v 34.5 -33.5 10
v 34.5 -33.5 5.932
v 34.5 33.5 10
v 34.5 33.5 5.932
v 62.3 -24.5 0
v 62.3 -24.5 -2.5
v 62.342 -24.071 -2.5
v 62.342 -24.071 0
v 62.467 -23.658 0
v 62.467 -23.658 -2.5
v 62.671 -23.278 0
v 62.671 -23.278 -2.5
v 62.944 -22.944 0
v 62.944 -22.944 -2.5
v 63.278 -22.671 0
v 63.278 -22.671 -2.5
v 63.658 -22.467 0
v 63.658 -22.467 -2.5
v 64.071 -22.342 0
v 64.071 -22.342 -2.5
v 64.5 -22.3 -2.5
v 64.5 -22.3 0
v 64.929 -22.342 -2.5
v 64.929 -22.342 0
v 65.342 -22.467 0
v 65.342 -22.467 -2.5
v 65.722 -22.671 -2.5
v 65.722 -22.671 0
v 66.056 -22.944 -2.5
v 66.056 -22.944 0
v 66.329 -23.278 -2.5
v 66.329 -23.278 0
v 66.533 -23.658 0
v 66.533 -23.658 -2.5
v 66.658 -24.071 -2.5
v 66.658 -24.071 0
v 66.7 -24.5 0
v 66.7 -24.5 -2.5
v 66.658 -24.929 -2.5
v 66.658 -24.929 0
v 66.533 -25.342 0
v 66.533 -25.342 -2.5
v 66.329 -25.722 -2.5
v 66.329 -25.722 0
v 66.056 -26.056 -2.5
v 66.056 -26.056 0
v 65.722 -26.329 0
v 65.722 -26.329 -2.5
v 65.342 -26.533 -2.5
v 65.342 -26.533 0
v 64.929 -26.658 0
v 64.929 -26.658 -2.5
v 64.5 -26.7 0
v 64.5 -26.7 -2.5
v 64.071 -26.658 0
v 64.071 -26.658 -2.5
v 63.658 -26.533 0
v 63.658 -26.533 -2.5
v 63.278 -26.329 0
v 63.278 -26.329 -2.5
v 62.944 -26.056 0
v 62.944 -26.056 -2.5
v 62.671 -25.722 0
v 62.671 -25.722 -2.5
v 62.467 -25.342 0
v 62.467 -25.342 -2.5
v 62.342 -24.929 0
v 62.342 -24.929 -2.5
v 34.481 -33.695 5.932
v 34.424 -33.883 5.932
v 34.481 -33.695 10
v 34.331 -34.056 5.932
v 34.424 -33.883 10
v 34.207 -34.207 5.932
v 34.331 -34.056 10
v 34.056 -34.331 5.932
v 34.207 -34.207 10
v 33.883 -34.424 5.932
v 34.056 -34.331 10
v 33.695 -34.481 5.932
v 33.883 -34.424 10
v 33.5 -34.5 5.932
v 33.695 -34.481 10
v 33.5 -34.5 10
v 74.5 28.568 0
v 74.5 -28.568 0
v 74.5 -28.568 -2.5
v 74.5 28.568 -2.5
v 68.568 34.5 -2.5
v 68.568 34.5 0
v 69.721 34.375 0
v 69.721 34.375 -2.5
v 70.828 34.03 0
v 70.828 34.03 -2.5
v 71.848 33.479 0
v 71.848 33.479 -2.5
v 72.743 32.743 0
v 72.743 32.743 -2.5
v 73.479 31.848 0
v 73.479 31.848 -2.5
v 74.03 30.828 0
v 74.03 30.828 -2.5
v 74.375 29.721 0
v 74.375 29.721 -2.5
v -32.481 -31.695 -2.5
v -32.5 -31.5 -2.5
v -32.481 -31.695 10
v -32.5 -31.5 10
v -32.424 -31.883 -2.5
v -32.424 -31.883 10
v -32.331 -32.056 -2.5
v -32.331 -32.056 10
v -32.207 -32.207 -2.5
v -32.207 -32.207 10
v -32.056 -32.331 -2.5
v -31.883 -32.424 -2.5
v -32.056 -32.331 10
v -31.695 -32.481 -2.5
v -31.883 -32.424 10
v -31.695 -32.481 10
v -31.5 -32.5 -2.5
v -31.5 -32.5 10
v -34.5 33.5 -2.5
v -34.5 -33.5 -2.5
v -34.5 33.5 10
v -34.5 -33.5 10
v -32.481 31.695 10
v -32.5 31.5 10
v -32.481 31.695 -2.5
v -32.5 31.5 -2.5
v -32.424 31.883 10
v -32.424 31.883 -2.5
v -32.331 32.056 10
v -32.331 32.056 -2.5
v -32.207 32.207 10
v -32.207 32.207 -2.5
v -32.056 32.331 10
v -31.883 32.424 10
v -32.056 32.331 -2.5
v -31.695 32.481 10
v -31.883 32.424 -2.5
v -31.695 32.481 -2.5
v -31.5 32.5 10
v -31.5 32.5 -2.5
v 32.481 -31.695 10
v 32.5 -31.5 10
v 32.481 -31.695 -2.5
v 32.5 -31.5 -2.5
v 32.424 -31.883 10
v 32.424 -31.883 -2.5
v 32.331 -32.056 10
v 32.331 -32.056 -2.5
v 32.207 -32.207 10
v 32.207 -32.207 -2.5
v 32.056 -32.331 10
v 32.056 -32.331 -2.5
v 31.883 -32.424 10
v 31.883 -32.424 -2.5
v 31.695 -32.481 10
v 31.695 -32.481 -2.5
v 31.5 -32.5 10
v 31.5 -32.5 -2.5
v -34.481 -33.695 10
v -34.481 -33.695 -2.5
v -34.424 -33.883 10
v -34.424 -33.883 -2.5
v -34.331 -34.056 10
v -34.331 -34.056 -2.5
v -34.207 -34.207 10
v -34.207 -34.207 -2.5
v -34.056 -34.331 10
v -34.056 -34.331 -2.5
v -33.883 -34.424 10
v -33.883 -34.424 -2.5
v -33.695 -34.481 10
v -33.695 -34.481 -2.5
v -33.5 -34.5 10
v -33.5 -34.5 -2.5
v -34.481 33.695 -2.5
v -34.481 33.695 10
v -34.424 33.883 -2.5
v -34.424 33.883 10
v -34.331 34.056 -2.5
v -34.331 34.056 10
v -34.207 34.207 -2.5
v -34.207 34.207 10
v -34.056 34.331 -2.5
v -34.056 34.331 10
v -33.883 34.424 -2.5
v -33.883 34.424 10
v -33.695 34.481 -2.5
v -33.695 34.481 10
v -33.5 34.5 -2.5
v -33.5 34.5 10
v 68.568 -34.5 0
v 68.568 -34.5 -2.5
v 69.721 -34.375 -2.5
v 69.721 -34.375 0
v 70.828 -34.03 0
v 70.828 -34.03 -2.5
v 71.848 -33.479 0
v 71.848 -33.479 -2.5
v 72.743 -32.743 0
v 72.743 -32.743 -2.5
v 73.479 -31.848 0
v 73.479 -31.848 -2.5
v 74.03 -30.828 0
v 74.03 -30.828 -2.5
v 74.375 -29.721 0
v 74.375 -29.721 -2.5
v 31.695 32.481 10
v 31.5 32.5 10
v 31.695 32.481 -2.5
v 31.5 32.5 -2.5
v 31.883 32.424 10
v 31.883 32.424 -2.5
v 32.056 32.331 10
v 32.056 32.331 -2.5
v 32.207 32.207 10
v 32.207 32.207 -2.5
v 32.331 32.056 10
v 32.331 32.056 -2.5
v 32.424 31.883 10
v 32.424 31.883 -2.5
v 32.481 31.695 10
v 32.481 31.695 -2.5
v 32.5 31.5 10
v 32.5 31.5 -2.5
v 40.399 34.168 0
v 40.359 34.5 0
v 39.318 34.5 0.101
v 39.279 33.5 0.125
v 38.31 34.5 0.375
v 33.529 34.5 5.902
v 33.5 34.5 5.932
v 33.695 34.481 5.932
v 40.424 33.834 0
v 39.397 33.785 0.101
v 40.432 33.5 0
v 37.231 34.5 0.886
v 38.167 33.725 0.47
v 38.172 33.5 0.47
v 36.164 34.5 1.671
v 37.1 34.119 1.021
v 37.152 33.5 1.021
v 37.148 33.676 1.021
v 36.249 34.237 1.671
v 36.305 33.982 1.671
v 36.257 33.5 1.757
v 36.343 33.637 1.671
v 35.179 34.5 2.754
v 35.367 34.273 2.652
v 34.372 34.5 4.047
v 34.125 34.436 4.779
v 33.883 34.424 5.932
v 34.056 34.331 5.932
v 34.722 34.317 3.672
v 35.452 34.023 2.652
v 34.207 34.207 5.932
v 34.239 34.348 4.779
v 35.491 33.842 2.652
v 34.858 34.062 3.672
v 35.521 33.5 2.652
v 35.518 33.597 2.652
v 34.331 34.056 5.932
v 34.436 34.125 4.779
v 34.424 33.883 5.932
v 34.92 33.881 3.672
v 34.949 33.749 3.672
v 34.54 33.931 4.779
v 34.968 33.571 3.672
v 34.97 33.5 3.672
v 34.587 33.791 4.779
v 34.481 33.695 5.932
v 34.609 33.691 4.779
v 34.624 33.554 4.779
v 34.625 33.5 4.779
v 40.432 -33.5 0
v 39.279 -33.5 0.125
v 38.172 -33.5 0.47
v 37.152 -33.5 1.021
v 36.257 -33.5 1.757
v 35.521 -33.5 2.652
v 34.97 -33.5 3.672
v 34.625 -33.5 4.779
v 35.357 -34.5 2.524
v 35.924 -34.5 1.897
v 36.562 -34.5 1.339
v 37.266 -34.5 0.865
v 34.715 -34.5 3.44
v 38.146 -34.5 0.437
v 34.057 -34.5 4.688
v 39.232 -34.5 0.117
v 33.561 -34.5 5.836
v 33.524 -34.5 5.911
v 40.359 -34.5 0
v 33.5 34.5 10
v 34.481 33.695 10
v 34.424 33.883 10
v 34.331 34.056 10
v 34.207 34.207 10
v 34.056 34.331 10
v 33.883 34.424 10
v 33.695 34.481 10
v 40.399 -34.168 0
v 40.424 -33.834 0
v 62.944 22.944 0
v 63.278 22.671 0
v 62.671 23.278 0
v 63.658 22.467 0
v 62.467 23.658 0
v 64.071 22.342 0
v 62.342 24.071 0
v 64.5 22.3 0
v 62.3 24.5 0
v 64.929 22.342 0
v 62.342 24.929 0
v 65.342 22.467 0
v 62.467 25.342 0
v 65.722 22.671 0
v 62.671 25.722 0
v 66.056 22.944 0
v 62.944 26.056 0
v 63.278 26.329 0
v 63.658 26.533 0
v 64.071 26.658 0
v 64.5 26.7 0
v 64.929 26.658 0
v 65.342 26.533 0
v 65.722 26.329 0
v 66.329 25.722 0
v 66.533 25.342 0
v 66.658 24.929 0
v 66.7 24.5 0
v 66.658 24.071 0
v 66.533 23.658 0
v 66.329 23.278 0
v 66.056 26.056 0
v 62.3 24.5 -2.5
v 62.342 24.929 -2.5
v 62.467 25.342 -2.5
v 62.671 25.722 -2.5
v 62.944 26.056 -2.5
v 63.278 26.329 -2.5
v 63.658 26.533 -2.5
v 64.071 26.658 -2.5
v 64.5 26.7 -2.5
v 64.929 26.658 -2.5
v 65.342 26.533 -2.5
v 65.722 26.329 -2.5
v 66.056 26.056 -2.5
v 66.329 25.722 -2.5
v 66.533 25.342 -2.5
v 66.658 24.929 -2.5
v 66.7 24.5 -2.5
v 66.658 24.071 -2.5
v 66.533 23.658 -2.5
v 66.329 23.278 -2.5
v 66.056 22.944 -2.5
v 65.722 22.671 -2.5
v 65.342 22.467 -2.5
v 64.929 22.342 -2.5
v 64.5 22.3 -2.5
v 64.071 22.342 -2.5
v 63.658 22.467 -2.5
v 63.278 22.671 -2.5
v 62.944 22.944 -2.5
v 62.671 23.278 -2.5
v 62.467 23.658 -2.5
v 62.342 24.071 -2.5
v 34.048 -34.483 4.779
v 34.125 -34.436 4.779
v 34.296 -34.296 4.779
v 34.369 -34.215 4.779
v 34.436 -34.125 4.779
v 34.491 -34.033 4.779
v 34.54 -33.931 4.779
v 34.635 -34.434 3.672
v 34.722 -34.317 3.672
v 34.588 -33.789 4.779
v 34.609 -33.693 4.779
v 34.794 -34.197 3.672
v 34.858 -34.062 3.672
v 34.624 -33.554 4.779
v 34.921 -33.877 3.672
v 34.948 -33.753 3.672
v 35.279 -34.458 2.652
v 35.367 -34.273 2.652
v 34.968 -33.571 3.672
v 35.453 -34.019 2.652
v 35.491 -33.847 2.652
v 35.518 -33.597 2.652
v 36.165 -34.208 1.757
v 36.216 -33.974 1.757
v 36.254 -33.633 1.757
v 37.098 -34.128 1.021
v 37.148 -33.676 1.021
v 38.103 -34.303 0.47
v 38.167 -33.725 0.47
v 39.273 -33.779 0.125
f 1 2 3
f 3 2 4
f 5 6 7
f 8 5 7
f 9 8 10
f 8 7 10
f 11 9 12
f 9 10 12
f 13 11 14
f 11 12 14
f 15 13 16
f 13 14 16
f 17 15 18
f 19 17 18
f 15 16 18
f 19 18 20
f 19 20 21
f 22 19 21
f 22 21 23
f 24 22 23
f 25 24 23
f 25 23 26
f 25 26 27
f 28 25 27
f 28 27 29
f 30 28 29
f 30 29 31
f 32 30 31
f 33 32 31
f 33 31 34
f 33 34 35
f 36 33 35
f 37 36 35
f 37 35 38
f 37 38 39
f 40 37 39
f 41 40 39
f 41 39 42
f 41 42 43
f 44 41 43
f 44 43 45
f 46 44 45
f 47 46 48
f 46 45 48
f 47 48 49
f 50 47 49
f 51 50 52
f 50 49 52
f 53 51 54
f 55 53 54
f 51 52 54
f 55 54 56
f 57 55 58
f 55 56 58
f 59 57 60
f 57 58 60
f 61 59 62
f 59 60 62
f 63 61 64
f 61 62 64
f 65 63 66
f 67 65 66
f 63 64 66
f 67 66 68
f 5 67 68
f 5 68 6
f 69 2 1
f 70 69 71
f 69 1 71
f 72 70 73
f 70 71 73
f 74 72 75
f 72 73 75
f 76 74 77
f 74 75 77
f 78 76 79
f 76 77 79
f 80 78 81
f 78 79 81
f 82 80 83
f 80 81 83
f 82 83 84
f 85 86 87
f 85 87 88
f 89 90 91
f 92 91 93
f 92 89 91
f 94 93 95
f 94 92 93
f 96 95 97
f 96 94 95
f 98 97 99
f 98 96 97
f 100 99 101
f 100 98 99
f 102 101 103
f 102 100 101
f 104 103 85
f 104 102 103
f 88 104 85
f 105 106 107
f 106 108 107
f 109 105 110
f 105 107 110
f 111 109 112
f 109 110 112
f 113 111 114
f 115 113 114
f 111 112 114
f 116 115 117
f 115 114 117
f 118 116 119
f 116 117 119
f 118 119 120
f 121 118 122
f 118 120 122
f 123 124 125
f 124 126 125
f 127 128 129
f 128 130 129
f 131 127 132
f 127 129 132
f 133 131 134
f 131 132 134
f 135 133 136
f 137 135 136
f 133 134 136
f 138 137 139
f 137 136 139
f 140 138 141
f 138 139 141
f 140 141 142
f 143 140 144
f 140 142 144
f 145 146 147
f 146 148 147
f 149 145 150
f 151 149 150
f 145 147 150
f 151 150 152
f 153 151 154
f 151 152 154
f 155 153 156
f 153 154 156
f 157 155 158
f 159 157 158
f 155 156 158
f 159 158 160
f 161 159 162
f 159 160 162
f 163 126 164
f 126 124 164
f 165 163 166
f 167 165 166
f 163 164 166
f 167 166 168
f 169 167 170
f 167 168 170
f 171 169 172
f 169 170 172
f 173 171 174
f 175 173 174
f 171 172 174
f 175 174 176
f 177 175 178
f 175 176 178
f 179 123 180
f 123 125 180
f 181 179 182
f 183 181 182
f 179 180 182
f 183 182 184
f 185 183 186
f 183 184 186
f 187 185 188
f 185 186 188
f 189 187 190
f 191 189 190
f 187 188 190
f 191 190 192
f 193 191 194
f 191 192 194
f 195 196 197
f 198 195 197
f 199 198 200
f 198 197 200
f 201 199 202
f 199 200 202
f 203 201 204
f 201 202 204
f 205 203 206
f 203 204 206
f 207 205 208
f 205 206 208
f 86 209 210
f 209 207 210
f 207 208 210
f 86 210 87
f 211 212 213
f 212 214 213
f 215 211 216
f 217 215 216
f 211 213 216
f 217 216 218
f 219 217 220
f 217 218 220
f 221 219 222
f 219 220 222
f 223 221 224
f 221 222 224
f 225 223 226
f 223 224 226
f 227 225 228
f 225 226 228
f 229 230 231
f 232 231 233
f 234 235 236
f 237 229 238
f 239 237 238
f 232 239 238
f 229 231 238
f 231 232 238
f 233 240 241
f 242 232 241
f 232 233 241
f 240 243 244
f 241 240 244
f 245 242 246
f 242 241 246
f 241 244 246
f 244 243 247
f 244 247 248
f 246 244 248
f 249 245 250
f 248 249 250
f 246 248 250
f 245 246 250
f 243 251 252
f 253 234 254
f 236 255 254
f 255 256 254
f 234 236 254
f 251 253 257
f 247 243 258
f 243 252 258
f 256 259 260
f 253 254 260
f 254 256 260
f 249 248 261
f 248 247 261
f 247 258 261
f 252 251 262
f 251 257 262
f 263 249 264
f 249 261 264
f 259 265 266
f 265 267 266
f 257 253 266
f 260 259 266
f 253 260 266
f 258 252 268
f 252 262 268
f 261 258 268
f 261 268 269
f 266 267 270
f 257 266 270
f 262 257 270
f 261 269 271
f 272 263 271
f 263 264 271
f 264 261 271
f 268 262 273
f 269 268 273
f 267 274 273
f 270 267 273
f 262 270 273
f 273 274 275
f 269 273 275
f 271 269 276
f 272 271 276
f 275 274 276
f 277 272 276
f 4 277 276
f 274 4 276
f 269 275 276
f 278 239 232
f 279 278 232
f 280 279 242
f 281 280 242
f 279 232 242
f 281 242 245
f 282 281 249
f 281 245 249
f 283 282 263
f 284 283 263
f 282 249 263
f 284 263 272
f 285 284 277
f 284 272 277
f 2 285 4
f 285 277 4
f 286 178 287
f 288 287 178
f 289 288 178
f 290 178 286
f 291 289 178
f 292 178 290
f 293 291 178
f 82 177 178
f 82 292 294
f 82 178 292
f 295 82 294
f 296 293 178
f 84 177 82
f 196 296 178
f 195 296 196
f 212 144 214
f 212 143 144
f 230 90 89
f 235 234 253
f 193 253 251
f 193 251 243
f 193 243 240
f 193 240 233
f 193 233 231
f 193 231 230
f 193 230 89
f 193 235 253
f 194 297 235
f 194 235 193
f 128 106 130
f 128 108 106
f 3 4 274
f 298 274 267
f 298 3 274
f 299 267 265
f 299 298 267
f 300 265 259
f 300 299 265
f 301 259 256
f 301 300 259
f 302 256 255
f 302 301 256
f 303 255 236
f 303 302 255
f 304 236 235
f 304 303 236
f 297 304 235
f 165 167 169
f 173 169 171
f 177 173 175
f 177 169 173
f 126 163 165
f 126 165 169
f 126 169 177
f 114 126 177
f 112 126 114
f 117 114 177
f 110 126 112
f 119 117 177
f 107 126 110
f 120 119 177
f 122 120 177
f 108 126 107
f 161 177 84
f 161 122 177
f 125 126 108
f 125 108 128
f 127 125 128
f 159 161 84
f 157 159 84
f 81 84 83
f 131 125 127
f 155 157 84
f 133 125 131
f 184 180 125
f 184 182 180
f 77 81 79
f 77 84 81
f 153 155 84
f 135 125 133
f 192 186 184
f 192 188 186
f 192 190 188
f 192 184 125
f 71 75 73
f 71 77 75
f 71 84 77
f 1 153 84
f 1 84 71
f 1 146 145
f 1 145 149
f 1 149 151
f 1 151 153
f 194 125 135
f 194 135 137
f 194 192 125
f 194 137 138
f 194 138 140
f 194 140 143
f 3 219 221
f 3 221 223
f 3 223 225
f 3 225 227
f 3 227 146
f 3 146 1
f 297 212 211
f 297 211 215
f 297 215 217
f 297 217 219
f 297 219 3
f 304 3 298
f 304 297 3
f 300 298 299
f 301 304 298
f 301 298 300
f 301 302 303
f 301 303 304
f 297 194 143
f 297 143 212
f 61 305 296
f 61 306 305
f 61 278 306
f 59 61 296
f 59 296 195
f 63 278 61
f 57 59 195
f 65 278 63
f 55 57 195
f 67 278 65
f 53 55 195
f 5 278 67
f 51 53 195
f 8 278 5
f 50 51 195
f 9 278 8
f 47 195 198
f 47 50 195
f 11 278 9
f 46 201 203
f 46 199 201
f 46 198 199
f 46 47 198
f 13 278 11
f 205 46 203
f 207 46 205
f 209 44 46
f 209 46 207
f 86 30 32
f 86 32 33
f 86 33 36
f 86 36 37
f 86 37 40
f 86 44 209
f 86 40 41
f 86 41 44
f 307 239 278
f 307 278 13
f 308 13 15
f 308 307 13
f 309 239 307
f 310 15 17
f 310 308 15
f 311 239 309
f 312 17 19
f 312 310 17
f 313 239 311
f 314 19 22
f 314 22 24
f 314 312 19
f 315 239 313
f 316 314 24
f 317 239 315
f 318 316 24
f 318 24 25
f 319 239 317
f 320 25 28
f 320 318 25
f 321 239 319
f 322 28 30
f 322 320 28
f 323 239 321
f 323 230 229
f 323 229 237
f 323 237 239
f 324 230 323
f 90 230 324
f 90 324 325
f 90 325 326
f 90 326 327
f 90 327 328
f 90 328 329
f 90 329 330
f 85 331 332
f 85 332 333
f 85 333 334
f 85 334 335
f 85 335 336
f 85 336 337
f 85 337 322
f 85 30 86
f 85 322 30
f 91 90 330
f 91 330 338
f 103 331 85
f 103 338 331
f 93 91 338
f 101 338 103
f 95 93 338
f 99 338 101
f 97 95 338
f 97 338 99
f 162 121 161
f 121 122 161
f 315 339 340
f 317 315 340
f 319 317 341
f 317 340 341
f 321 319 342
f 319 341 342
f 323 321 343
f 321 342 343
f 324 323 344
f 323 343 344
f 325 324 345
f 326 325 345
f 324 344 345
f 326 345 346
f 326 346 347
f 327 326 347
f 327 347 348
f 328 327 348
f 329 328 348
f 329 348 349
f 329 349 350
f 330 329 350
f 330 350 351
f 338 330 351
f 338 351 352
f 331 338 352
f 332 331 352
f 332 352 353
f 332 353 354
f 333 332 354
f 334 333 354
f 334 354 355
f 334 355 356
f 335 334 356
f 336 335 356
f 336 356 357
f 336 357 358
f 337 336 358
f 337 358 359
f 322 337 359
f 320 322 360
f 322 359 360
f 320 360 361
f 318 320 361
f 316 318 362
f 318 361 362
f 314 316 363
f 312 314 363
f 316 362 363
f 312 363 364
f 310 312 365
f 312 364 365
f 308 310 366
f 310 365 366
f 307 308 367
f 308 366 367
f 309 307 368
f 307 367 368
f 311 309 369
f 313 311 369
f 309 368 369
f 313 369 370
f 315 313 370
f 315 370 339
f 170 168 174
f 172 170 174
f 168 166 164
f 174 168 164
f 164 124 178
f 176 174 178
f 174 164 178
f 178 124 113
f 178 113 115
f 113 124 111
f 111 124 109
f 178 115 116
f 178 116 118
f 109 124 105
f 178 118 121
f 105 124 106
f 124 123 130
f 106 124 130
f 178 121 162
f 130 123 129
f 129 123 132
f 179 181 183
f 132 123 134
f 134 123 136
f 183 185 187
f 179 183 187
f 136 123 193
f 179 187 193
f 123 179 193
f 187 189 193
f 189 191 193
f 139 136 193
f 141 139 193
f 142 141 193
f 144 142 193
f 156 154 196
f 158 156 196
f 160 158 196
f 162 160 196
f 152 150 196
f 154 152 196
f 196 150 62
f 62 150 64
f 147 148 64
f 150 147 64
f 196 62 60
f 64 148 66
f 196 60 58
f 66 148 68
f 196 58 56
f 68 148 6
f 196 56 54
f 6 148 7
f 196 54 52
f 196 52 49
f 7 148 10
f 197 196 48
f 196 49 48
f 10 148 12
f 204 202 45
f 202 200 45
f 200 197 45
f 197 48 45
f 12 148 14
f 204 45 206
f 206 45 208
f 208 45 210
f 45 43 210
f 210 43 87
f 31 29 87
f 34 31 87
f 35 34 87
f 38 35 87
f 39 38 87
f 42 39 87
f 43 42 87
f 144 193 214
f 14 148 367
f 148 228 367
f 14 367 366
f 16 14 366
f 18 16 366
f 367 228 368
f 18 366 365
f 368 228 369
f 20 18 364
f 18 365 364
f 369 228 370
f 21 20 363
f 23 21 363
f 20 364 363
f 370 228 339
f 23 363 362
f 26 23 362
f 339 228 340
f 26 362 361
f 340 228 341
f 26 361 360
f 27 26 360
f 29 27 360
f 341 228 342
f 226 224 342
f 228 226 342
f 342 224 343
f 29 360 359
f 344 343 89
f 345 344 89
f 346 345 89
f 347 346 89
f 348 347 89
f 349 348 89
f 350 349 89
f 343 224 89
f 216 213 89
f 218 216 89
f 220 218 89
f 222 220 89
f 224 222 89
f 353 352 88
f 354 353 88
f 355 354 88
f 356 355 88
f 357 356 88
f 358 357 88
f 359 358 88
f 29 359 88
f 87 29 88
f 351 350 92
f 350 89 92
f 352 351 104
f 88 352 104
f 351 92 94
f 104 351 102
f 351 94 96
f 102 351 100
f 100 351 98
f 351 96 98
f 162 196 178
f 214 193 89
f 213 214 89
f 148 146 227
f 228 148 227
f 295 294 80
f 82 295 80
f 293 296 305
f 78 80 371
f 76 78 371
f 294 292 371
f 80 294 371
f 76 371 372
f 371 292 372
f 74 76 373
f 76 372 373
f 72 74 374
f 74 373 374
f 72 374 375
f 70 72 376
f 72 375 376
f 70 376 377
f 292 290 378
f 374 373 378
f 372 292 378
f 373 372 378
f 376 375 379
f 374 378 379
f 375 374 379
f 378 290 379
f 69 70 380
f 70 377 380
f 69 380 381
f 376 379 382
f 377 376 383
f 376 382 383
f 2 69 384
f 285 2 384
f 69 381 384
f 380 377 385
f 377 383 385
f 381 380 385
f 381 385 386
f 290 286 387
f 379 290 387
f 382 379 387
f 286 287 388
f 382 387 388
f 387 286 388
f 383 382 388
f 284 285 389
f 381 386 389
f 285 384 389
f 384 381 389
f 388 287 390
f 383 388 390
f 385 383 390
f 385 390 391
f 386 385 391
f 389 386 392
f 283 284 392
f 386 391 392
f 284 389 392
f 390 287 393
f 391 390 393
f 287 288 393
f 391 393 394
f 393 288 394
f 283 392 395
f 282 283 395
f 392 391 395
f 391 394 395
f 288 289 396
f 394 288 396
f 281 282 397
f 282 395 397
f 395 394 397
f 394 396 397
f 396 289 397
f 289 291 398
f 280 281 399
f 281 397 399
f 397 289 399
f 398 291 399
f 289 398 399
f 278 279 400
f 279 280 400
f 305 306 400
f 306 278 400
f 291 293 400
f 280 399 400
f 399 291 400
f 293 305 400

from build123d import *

# Parameters (mm, degrees)
F0_W         = 69
F0_H         = 69
F0_W_2       = 65
F0_H_2       = 65
F1_DEPTH     = 10
F0_W_3       = 40
F2_DEPTH     = 2.5
F3_R         = 1
F4_T1_DEPTH  = 67
F4_T6_ANGLE  = 359.64
F4_T12_ANGLE = 359.64
F4_T15_DEPTH = 32.5048284938
F5_D         = 4.4


# Not quite as in the source:
# - a fillet or chamfer that OpenCascade refuses, or shapes differently, is made with other operations: its cross-section is extruded or revolved along the edge and cut away or added


with BuildPart() as f1:
    # F0 (on Top) → F1 (new body)
    with BuildSketch(Plane.XY):
        Rectangle(F0_W, F0_H)
        Rectangle(F0_W_2, F0_H_2, mode=Mode.SUBTRACT)
    extrude(amount=F1_DEPTH)

    # F0 (on Top) → F2 (join)
    with BuildSketch(Plane.XY):
        with Locations((54.5, 0)):
            Rectangle(F0_W_3, F0_H)
        Rectangle(F0_W, F0_H)
        Rectangle(F0_W_2, F0_H_2, mode=Mode.SUBTRACT)
    extrude(amount=-F2_DEPTH)

    # F3
    f3_edges = [f1.edges().sort_by_distance(p)[0] for p in [
        (32.5, 32.5, 3.75),
        (-32.5, 32.5, 3.75),
        (-32.5, -32.5, 3.75),
        (32.5, -32.5, 3.75),
        (-34.5, 34.5, 3.75),
        (-34.5, -34.5, 3.75),
        (34.5, 34.5, 5),
        (34.5, -34.5, 5),
    ]]
    fillet(f3_edges, radius=F3_R)

    # F4: fillet of radius 6 on 3 edges, made by hand

    # F4_s2 → F4_t1 (join)
    with BuildSketch(Plane.XZ.offset(-33.5)):
        with BuildLine():
            ThreePointArc((40.5009656854, -0.0004), (36.2573593129, 1.7573593129), (34.4996, 6.0009656854))
            Line((34.4996, 6.0009656854), (33.8994634315, 6.0009656854))
            ThreePointArc((33.8994634315, 6.0009656854), (33.8998634315, 3.0004828427), (33.8998634315, 0))
            Line((33.8998634315, 0), (34.5, -0.6001365685))
            ThreePointArc((34.5, -0.6001365685), (37.5004828427, -0.6001365685), (40.5009656854, -0.6005365685))
            Line((40.5009656854, -0.6005365685), (40.5009656854, -0.0004))
        make_face()
    extrude(amount=F4_T1_DEPTH)


with BuildPart() as f4_tool4:
    # F4_s5 → F4_t6 (revolve)
    with BuildSketch(Plane(origin=(0.2118036776, -33.7091586585, 0), x_dir=(0, 0, 1), z_dir=(0.006283144, -0.9999802609, 0))):
        with BuildLine():
            ThreePointArc((6.0009656854, -34.2884534158), (1.7573593129, -36.0462127287), (-0.0004, -40.2898191013))
            Line((-0.0004, -40.2898191013), (-0.6005365685, -40.2898191013))
            ThreePointArc((-0.6005365685, -40.2898191013), (-0.6001365685, -37.2893362585), (-0.6001365685, -34.2888534158))
            Line((-0.6001365685, -34.2888534158), (0, -33.6887168473))
            ThreePointArc((0, -33.6887168473), (3.0004828427, -33.6887168473), (6.0009656854, -33.6883168473))
            Line((6.0009656854, -33.6883168473), (6.0009656854, -34.2884534158))
        make_face()
    revolve(axis=Axis((33.5, -33.5, 0), (0, 0, 1)), revolution_arc=F4_T6_ANGLE)

    split(bisect_by=Plane.XZ.offset(34.5), keep=Keep.BOTTOM)

    split(bisect_by=Plane.YZ.offset(32.5), keep=Keep.TOP)


with BuildPart() as f1_1:
    add(f1.part)

    # F4_t3: union F4_tool4
    add(f4_tool4.part)


with BuildPart() as f4_tool10:
    # F4_s11 → F4_t12 (revolve)
    with BuildSketch(Plane(origin=(0.2118036776, 33.7091586585, 0), x_dir=(0, 0, 1), z_dir=(0.006283144, 0.9999802609, 0))):
        with BuildLine():
            ThreePointArc((-0.0004, 40.2898191013), (1.7573593129, 36.0462127287), (6.0009656854, 34.2884534158))
            Line((6.0009656854, 34.2884534158), (6.0009656854, 33.6883168473))
            ThreePointArc((6.0009656854, 33.6883168473), (3.0004828427, 33.6887168473), (0, 33.6887168473))
            Line((0, 33.6887168473), (-0.6001365685, 34.2888534158))
            ThreePointArc((-0.6001365685, 34.2888534158), (-0.6001365685, 37.2893362585), (-0.6005365685, 40.2898191013))
            Line((-0.6005365685, 40.2898191013), (-0.0004, 40.2898191013))
        make_face()
    revolve(axis=Axis((33.5, 33.5, 0), (0, 0, -1)), revolution_arc=F4_T12_ANGLE)

    split(bisect_by=Plane.XZ.offset(-34.5), keep=Keep.TOP)

    split(bisect_by=Plane.YZ.offset(32.5), keep=Keep.TOP)


with BuildPart() as f1_2:
    add(f1_1.part)

    # F4_t9: union F4_tool10
    add(f4_tool10.part)

    # F4_s16 → F4_t15 (cut)
    with BuildSketch(Plane.XY.offset(-17.5024142469)):
        with BuildLine():
            ThreePointArc((68.4990343146, 34.5004), (72.7426406871, 32.7426406871), (74.5004, 28.4990343146))
            Line((74.5004, 28.4990343146), (75.1005365685, 28.4990343146))
            ThreePointArc((75.1005365685, 28.4990343146), (75.1001365685, 31.4995171573), (75.1001365685, 34.5))
            Line((75.1001365685, 34.5), (74.5, 35.1001365685))
            ThreePointArc((74.5, 35.1001365685), (71.4995171573, 35.1001365685), (68.4990343146, 35.1005365685))
            Line((68.4990343146, 35.1005365685), (68.4990343146, 34.5004))
        make_face()
        with BuildLine():
            ThreePointArc((68.4990343146, -34.5004), (72.7426406871, -32.7426406871), (74.5004, -28.4990343146))
            Line((74.5004, -28.4990343146), (75.1005365685, -28.4990343146))
            ThreePointArc((75.1005365685, -28.4990343146), (75.1001365685, -31.4995171573), (75.1001365685, -34.5))
            Line((75.1001365685, -34.5), (74.5, -35.1001365685))
            ThreePointArc((74.5, -35.1001365685), (71.4995171573, -35.1001365685), (68.4990343146, -35.1005365685))
            Line((68.4990343146, -35.1005365685), (68.4990343146, -34.5004))
        make_face()
    extrude(amount=F4_T15_DEPTH, mode=Mode.SUBTRACT)

    # F5 (through all)
    with Locations(Plane.XY):
        with Locations((64.5, -24.5), (64.5, 24.5)):
            Hole(F5_D / 2)


solid = f1_2.part
